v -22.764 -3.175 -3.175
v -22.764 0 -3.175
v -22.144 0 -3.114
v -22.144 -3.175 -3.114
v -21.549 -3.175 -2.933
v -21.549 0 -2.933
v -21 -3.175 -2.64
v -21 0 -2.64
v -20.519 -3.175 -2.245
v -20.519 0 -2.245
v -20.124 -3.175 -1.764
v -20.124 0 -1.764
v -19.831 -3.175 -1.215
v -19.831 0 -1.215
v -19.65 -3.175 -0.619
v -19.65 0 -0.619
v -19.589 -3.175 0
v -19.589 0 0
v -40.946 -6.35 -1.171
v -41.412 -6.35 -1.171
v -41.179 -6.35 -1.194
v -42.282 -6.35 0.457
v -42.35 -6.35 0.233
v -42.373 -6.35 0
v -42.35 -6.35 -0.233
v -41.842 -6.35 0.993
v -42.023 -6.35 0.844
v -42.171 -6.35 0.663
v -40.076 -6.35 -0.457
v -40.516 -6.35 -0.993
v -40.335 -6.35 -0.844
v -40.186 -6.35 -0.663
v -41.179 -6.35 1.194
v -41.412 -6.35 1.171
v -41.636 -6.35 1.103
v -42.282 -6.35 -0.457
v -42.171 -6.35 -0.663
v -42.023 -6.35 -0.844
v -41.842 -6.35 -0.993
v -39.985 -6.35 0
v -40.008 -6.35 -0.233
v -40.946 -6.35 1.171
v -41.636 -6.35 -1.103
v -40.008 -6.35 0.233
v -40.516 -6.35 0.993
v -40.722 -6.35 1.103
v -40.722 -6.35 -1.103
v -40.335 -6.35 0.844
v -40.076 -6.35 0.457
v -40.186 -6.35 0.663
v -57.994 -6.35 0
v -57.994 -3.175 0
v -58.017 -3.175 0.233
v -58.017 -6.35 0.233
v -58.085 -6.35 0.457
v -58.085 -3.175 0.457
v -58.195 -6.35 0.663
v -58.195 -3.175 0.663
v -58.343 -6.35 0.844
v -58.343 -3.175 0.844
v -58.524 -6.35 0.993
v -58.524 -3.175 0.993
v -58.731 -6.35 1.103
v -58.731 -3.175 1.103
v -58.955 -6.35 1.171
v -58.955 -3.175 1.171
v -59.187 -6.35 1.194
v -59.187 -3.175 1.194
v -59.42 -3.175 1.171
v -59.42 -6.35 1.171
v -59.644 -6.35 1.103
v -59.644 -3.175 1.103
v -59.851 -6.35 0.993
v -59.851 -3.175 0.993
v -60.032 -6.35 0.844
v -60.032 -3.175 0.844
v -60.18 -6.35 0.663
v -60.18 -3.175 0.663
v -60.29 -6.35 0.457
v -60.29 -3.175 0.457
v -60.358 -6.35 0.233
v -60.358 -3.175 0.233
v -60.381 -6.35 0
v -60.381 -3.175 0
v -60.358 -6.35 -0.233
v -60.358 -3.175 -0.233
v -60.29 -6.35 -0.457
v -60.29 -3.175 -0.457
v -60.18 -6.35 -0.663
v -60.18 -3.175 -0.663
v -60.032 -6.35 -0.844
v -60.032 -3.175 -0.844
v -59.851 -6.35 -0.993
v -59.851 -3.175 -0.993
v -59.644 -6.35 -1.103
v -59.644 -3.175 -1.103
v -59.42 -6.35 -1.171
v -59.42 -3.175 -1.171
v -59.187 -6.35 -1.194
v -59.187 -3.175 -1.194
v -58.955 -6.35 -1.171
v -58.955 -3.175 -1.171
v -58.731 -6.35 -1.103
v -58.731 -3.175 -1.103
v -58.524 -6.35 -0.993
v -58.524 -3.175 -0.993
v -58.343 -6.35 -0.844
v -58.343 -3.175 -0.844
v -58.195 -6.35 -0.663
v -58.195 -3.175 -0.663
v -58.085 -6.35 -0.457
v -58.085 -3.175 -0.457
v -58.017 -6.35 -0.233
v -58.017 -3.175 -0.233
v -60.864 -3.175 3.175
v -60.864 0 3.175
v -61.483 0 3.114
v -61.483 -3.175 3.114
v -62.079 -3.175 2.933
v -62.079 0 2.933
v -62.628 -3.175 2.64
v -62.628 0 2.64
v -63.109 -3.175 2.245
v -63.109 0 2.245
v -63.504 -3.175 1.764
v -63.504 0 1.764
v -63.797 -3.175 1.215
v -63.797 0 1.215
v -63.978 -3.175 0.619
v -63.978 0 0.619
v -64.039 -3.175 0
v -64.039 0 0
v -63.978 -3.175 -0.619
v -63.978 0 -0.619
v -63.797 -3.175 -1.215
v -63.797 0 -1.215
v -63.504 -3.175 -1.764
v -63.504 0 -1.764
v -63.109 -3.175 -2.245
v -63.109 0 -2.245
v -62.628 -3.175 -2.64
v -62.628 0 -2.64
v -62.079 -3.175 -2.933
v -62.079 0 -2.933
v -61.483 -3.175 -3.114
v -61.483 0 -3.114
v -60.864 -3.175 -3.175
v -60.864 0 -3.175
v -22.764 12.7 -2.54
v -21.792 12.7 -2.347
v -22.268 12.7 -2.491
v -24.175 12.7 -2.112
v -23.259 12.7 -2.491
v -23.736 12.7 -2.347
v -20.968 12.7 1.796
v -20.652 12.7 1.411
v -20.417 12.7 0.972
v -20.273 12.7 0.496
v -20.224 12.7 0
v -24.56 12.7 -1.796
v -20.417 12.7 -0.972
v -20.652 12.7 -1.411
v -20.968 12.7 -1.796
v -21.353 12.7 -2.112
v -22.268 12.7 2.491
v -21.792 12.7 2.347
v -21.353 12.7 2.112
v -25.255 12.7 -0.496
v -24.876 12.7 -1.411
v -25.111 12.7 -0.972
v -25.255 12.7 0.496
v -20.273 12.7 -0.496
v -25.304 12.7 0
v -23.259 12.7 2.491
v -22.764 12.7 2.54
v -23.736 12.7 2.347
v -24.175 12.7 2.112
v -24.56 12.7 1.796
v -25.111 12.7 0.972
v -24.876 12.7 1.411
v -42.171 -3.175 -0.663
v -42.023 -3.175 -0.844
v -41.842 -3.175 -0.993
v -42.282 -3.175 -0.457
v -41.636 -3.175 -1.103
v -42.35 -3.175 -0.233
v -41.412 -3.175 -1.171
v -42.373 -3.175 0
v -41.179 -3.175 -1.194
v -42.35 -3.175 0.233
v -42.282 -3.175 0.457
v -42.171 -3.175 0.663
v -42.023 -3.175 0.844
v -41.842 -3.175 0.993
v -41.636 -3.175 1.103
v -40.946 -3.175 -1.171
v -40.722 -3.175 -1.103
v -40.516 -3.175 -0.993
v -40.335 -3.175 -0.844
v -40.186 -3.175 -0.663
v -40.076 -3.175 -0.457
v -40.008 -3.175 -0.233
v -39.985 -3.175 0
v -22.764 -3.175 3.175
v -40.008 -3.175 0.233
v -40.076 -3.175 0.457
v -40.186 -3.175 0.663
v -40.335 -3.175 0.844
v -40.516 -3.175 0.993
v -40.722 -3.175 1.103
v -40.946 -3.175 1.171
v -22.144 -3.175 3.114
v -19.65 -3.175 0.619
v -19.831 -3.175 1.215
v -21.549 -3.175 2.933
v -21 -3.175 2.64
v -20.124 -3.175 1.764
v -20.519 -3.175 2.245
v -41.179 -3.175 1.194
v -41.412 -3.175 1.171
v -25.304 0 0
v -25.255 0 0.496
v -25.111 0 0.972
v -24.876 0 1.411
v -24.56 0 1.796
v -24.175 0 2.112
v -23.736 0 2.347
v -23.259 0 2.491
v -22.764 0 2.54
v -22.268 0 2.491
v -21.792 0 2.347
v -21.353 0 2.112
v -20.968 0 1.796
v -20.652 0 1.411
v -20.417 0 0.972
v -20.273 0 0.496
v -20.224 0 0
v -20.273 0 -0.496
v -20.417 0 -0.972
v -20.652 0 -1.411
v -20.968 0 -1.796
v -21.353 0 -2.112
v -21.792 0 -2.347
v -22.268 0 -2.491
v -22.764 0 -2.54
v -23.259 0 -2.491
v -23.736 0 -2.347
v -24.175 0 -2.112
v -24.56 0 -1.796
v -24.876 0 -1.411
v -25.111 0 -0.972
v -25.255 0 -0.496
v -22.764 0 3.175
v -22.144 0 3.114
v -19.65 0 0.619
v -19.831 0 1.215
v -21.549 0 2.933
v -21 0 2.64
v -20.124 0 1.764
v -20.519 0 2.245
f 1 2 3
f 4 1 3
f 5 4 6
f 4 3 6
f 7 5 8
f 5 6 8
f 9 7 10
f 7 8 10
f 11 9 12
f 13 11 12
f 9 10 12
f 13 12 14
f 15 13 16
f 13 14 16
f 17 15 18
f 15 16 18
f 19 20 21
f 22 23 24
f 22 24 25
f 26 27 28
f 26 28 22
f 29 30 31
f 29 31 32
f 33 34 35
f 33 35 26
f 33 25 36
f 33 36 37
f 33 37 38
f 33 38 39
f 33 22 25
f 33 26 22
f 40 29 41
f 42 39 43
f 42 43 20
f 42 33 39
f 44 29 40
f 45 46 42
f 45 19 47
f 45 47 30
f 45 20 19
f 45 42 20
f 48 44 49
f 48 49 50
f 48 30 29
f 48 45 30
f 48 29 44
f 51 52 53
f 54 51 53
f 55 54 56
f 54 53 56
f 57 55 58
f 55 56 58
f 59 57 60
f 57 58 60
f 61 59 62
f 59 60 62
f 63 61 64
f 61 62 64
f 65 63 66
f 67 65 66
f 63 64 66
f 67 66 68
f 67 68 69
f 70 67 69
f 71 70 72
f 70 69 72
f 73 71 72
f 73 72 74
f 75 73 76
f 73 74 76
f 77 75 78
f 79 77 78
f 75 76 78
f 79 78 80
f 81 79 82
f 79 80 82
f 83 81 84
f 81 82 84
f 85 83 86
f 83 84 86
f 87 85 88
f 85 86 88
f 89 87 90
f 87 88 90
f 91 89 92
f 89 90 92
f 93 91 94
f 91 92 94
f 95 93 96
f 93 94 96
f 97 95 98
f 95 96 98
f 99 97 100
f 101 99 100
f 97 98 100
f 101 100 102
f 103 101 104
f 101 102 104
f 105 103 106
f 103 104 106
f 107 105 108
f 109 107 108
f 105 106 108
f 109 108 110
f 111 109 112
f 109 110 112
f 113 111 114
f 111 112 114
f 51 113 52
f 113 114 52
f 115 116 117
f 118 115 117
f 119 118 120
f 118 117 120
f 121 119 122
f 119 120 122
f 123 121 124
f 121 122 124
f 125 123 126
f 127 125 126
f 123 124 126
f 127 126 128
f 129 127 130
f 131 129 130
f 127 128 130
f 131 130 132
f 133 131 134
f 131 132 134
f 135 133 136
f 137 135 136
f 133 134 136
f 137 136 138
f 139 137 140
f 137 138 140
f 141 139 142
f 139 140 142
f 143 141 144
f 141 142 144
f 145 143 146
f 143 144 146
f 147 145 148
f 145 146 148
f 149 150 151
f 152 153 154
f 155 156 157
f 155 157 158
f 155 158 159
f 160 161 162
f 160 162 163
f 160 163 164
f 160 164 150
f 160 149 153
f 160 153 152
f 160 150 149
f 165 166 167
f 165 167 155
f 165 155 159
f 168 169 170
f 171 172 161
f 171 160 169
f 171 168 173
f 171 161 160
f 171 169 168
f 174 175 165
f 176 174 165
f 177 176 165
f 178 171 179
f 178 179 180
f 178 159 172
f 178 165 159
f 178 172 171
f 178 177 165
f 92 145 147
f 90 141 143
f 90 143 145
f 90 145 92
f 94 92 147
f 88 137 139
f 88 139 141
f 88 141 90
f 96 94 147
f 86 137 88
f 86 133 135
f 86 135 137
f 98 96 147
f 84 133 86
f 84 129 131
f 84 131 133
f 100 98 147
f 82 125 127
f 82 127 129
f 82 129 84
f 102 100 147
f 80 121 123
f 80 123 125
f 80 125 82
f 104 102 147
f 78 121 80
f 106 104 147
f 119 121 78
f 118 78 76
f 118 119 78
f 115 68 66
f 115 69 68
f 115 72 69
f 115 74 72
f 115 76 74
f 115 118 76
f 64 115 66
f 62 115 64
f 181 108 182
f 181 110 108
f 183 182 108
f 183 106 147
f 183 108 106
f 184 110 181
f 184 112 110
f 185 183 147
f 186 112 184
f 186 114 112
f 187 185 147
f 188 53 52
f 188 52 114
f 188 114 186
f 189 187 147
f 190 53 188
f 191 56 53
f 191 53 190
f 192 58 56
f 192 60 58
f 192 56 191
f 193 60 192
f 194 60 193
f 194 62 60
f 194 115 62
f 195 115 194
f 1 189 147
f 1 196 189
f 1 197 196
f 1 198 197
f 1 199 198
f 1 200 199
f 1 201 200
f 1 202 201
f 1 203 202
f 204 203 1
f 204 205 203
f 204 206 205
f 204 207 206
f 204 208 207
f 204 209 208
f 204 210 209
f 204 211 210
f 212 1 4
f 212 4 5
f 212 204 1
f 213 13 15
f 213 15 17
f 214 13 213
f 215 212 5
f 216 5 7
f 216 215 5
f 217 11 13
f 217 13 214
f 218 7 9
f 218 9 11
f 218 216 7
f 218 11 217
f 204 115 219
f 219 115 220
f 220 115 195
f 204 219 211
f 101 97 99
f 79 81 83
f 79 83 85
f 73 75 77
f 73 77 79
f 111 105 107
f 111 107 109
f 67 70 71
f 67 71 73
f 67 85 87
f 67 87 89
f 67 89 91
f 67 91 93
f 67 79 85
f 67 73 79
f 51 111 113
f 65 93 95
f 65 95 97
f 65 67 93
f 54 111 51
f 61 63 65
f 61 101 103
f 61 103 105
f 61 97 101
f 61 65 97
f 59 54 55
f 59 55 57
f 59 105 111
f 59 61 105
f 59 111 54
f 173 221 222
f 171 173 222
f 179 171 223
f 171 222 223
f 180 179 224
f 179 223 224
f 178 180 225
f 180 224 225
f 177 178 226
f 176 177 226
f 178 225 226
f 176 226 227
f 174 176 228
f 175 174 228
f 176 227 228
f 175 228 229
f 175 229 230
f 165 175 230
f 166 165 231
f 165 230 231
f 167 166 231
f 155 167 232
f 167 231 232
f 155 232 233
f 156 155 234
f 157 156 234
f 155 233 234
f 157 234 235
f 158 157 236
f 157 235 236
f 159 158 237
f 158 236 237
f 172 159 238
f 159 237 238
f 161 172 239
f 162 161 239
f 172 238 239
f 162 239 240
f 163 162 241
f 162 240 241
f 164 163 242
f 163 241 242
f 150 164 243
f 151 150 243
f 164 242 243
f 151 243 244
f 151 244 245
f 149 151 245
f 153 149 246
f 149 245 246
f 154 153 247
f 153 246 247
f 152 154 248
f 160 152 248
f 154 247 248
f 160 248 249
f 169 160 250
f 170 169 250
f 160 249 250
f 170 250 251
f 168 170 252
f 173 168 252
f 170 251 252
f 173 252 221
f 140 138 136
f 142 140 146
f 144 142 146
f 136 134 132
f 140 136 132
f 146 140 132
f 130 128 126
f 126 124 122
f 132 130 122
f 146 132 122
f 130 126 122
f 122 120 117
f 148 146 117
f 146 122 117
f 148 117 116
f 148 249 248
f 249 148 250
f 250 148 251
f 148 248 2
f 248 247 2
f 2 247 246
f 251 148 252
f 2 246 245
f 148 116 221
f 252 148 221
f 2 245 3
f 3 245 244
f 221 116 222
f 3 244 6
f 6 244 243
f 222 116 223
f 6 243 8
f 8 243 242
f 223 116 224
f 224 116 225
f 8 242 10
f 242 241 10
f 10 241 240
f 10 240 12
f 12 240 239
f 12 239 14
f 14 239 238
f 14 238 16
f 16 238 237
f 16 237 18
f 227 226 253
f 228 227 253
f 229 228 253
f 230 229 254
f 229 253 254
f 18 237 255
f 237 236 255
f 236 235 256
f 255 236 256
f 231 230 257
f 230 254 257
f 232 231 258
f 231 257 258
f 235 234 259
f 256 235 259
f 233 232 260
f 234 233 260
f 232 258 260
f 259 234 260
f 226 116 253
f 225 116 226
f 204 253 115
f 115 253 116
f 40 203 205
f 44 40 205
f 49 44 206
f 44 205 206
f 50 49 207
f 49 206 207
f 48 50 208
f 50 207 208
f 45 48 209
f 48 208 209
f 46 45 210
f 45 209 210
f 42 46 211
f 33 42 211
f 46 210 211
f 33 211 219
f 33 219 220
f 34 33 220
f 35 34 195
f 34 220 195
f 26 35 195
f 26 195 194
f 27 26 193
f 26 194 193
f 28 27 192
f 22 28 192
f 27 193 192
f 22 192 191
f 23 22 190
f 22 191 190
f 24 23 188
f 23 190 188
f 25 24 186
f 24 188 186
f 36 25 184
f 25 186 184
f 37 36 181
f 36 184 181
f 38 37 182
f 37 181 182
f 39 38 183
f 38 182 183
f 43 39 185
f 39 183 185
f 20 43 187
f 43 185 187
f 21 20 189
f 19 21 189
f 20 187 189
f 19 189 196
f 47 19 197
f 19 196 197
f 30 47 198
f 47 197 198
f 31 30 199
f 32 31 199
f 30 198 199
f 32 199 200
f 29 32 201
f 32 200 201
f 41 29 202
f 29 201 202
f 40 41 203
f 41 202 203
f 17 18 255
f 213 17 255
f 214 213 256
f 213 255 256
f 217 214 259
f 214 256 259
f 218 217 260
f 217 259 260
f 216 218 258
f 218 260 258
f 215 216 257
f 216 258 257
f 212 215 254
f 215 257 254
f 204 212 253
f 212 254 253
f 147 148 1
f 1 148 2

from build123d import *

# Parameters (mm, degrees)
F1_DEPTH = 3.175
F2_R     = 1.1938
F3_DEPTH = 3.175
F4_R     = 2.54
F5_DEPTH = 12.7


with BuildPart() as f1:
    # F0 (on Front) → F1 (new body)
    with BuildSketch(Plane.XZ):
        with BuildLine():
            ThreePointArc((-60.863849, -3.175), (-58.618785, -2.245064), (-57.688849, 0))
            ThreePointArc((-57.688849, 0), (-58.618785, 2.245064), (-60.863849, 3.175))
            ThreePointArc((-60.863849, 3.175), (-64.038849, 0), (-60.863849, -3.175))
        make_face()
        with BuildLine():
            ThreePointArc((-60.863849, 3.175), (-58.618785, 2.245064), (-57.688849, 0))
            ThreePointArc((-57.688849, 0), (-58.618785, -2.245064), (-60.863849, -3.175))
            Line((-60.863849, -3.175), (-22.763849, -3.175))
            ThreePointArc((-22.763849, -3.175), (-25.938849, 0), (-22.763849, 3.175))
            Line((-22.763849, 3.175), (-60.863849, 3.175))
        make_face()
        with BuildLine():
            ThreePointArc((-19.588849, 0), (-20.518785, 2.245064), (-22.763849, 3.175))
            ThreePointArc((-22.763849, 3.175), (-25.938849, 0), (-22.763849, -3.175))
            ThreePointArc((-22.763849, -3.175), (-20.518785, -2.245064), (-19.588849, 0))
        make_face()
    extrude(amount=F1_DEPTH)

    # F2 (on face) → F3 (join)
    with BuildSketch(Plane.XZ.offset(3.175)):
        with Locations((-41.178849, 0)):
            Circle(F2_R)
        with Locations((-59.187449, 0)):
            Circle(F2_R)
    extrude(amount=F3_DEPTH)

    # F4 (on face) → F5 (join)
    with BuildSketch(Plane(origin=(0, 0, 0), x_dir=(-1, 0, 0), z_dir=(0, 1, 0))):
        with Locations((22.763849, 0)):
            Circle(F4_R)
    extrude(amount=F5_DEPTH)


solid = f1.part
